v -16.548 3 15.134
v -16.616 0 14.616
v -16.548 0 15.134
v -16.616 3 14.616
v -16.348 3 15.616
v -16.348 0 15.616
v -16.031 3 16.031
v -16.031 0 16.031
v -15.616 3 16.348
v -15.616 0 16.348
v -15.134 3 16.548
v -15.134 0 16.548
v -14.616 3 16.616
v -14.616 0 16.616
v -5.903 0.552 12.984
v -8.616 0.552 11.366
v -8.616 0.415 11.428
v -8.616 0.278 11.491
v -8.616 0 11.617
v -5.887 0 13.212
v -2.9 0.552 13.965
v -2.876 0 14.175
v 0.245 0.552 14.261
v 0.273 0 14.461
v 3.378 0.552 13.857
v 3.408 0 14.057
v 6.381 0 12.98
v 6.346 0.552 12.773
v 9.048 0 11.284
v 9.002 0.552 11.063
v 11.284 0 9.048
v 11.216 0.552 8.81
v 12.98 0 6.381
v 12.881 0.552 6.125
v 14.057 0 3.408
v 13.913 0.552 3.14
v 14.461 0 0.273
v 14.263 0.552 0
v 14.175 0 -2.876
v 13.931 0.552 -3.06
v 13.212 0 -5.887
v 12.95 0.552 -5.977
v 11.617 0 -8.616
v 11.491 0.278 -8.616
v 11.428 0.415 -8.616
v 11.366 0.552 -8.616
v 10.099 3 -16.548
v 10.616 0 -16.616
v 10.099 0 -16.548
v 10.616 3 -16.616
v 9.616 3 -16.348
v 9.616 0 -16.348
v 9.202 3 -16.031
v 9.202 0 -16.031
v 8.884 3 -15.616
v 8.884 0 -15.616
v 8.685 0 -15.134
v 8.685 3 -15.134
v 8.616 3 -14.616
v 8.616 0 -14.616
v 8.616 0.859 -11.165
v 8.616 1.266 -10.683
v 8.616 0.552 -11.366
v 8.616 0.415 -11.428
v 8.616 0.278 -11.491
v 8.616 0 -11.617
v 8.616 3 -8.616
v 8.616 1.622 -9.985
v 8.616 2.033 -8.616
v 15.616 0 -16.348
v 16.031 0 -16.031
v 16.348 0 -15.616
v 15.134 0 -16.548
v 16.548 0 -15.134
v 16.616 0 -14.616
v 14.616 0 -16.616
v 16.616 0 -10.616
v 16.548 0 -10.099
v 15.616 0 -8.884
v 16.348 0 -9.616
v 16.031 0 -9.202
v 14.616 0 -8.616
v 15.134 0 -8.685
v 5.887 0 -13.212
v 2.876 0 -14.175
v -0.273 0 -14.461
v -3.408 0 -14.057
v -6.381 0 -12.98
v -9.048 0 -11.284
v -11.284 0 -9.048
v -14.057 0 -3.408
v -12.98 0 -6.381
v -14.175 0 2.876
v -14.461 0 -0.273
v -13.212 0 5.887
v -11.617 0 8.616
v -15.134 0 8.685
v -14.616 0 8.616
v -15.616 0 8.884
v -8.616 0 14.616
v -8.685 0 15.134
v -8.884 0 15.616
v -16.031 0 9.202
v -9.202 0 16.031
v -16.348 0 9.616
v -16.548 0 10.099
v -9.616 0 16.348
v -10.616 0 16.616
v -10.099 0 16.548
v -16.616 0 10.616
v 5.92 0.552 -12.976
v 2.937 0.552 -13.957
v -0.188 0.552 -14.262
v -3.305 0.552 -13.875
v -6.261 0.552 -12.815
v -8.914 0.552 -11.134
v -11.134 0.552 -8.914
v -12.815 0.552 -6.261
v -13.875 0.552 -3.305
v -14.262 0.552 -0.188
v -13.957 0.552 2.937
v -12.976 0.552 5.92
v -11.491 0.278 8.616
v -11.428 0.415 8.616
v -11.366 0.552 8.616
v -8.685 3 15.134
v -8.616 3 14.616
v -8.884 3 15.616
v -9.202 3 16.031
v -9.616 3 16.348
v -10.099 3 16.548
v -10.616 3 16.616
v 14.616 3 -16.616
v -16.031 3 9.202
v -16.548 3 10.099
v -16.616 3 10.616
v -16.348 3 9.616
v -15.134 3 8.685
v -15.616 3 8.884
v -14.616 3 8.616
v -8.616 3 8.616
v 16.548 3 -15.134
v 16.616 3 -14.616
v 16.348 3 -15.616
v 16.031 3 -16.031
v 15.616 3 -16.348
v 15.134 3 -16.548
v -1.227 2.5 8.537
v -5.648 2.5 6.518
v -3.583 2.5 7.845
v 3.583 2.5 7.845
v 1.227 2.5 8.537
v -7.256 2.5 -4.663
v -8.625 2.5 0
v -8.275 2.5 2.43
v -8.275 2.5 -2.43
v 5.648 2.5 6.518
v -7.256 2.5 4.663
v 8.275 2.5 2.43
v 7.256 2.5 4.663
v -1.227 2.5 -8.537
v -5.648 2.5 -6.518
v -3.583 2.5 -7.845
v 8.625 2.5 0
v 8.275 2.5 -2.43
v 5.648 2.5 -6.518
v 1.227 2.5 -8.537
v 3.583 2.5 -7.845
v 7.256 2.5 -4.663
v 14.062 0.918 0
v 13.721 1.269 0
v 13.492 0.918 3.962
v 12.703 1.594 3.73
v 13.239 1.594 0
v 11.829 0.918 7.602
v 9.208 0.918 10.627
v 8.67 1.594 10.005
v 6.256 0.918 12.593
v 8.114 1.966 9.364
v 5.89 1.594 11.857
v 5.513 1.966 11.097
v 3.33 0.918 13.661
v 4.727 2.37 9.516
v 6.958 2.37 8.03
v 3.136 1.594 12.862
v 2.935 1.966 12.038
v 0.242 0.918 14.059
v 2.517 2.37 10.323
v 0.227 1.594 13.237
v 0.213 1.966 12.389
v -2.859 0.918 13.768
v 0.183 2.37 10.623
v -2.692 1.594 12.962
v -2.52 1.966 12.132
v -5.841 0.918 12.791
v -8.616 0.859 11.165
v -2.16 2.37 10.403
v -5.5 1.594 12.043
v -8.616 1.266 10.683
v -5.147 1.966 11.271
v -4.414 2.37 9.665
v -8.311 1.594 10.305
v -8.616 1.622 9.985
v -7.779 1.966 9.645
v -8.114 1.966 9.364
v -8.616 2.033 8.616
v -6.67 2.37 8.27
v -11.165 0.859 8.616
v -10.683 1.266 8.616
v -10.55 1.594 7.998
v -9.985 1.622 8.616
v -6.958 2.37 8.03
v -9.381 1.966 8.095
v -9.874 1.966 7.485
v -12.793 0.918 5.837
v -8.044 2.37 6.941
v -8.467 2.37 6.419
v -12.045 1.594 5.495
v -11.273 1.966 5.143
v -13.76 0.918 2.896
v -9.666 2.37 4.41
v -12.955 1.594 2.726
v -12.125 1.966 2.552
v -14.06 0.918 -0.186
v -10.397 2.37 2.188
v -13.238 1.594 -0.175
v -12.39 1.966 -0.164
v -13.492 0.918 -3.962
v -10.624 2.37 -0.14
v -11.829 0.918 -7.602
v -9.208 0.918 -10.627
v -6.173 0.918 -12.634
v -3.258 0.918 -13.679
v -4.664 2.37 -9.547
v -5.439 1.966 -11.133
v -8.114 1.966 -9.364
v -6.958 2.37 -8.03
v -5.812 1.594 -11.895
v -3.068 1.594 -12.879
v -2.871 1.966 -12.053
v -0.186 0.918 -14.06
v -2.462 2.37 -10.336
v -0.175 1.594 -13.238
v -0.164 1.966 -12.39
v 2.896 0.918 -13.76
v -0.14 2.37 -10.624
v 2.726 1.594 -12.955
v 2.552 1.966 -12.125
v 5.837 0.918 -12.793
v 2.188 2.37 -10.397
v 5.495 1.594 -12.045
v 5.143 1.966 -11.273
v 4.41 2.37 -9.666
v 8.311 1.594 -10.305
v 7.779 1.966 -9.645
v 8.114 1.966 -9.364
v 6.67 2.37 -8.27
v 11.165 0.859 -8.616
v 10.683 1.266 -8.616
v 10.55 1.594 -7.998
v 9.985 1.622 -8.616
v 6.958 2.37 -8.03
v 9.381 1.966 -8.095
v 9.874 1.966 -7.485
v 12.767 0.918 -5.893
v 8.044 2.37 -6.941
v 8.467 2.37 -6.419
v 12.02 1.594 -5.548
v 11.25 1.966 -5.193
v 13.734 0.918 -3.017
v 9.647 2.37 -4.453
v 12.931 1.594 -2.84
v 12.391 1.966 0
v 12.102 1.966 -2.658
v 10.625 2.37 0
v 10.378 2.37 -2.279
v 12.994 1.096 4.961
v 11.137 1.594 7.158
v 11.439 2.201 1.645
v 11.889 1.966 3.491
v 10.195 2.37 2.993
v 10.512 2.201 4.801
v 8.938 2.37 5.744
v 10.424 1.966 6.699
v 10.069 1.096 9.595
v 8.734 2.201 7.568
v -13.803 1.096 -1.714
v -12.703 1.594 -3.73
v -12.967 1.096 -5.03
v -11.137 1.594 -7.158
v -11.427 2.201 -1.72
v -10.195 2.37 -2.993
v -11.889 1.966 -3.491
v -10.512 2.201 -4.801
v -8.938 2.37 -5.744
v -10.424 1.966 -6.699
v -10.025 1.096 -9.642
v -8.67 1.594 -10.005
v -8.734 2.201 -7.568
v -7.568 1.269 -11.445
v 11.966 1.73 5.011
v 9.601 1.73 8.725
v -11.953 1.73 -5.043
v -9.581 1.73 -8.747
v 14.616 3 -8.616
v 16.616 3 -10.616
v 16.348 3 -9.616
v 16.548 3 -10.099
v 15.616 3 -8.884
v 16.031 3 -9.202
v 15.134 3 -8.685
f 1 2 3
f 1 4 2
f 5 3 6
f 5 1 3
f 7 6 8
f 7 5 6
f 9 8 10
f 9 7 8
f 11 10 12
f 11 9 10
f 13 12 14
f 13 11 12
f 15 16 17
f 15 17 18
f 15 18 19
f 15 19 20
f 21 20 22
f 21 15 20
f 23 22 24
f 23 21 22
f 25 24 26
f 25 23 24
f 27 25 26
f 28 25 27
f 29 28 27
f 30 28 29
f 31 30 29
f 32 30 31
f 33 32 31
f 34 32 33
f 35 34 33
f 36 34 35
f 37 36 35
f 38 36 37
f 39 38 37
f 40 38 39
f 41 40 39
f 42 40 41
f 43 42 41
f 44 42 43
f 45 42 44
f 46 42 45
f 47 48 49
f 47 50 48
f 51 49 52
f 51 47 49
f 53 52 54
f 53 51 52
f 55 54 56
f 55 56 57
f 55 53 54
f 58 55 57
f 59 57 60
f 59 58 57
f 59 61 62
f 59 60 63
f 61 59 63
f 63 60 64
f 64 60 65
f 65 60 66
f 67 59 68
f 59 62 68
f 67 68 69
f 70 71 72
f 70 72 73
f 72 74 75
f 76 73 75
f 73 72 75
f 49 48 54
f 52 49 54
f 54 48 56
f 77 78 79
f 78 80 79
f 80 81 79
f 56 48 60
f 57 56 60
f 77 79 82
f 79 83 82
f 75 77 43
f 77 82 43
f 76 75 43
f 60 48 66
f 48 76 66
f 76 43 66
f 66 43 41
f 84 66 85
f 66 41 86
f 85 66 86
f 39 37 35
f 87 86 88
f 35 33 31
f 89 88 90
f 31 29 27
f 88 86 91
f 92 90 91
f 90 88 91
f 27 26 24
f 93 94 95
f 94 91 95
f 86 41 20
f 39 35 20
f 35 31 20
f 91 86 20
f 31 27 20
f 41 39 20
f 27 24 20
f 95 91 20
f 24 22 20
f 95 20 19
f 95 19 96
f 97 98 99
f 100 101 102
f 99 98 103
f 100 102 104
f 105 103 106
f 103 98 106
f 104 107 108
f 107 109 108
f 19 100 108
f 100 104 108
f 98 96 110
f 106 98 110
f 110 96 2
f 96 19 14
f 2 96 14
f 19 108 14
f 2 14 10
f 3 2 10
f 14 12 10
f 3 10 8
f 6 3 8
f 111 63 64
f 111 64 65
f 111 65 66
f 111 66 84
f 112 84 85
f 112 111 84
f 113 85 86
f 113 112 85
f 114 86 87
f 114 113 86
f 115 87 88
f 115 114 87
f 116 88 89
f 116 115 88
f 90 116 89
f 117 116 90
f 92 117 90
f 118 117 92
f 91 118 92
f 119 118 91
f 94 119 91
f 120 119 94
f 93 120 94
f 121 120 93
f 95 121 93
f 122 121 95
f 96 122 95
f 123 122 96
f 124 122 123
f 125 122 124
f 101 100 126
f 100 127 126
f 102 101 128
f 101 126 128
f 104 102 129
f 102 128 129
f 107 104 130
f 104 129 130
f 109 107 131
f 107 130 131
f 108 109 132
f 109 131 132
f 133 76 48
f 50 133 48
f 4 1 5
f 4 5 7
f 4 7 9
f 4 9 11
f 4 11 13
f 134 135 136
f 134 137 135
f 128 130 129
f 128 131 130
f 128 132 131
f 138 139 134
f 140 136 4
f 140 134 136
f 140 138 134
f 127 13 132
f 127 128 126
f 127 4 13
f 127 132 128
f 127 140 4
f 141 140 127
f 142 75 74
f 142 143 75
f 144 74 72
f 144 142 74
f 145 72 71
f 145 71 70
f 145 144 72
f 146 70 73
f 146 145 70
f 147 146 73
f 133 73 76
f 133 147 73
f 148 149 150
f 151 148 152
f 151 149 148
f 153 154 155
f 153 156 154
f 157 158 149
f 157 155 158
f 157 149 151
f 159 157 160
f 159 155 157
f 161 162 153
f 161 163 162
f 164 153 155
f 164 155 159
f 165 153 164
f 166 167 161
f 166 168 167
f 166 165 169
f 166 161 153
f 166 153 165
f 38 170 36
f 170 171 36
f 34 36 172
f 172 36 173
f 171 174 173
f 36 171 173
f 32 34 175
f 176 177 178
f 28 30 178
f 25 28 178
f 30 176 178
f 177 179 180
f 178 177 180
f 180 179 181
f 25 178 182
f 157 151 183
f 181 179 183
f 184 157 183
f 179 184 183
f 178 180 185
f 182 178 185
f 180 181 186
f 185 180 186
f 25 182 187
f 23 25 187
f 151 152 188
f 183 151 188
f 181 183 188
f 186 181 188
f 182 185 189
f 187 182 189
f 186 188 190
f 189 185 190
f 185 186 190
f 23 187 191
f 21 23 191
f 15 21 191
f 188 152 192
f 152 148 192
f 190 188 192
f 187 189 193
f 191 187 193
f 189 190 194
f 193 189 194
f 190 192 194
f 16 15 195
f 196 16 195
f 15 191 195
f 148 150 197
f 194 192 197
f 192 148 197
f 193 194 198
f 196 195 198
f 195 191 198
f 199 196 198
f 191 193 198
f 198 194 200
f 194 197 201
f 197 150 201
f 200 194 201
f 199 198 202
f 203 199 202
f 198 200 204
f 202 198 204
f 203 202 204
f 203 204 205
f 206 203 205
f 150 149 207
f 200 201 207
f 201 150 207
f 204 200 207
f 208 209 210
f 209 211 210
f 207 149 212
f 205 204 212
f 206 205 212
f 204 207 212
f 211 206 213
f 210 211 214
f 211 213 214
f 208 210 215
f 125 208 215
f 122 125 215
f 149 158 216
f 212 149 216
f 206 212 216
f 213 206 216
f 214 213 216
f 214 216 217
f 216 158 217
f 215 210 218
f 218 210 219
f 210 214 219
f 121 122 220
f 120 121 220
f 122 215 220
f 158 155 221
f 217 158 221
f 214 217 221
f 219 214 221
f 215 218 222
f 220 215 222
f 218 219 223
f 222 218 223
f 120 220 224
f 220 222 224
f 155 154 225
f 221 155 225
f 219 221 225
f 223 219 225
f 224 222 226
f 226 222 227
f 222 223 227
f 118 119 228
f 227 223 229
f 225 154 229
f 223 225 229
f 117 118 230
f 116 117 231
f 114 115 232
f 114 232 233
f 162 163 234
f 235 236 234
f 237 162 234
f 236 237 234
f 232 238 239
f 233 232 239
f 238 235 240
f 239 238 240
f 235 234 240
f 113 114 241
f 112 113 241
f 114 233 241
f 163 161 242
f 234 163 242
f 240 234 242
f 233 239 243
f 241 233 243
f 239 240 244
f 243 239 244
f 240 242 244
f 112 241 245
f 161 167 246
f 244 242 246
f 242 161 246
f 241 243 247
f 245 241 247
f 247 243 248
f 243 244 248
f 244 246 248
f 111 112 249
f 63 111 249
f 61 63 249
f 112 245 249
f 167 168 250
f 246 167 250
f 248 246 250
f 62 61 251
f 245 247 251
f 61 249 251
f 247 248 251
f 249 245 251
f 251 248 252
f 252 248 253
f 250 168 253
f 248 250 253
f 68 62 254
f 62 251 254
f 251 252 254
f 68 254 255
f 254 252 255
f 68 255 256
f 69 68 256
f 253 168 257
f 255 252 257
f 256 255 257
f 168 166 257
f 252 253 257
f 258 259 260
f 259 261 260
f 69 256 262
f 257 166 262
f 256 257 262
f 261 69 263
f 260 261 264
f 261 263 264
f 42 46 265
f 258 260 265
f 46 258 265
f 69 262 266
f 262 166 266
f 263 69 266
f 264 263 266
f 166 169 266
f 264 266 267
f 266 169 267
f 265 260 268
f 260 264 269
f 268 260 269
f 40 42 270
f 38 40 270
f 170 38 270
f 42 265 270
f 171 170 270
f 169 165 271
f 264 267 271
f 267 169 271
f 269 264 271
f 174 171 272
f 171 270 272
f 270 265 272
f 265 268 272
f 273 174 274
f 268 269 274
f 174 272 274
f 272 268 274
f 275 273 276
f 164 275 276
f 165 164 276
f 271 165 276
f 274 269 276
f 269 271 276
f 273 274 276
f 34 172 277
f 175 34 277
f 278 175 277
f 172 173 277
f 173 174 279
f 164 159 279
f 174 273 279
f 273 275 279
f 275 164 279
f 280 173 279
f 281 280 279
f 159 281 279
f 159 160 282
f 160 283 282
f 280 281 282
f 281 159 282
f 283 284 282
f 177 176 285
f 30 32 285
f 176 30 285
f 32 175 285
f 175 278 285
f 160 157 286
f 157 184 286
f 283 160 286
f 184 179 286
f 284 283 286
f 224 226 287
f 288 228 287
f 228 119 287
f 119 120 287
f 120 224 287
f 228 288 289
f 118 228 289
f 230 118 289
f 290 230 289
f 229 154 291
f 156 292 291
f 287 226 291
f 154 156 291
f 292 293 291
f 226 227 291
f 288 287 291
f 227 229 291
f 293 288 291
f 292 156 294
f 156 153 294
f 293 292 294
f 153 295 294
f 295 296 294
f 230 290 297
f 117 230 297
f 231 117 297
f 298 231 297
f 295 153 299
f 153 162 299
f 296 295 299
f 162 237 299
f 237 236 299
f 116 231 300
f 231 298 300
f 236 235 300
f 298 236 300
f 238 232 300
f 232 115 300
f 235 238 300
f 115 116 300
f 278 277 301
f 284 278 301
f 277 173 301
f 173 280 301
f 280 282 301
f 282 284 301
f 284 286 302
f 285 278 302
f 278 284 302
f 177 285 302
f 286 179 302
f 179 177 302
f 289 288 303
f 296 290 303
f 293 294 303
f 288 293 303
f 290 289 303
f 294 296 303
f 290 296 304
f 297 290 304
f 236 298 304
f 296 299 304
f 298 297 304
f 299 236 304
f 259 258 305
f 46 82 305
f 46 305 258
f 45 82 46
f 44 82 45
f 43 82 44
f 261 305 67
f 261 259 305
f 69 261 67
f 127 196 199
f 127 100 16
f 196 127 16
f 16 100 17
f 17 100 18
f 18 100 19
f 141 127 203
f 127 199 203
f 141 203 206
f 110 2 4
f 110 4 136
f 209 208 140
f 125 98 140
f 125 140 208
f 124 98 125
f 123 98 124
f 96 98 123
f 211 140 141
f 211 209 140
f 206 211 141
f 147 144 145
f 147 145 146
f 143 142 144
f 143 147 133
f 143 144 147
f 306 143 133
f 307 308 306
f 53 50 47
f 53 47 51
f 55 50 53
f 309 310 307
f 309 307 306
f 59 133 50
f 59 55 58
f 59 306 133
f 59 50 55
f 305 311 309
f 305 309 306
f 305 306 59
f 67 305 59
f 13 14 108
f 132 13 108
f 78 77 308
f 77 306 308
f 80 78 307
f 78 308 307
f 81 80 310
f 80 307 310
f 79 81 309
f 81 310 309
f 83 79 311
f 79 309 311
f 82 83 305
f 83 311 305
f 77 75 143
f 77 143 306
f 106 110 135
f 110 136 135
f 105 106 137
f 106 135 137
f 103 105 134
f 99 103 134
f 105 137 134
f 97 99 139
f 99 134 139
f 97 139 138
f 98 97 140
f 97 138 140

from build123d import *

# Parameters (mm, degrees)
SKETCH2_R                = 14.463803576
BOSS_EXTRUDE1_DEPTH      = 2.5
BOSS_EXTRUDE1_TAPER      = 20
SKETCH4_W                = 8
SKETCH4_H                = 8
BOSS_EXTRUDE2_DEPTH      = 3
FILLET2_R                = 2
CIRPATTERN1_COUNT        = 4
FILLET2_OF_CIRPATTERN1_R = 2


with BuildPart() as part:
    # Sketch2 → Boss-Extrude1 (new body)
    with BuildSketch(Plane(origin=(0, 0, 0), x_dir=(1, 0, 0), z_dir=(0, 1, 0))):
        Circle(SKETCH2_R)
    extrude(amount=BOSS_EXTRUDE1_DEPTH, taper=BOSS_EXTRUDE1_TAPER)

    # Fillet1
    # an asymmetric fillet: 6, 4 mm, written as the material it takes off along each edge
    with BuildSketch(Plane(origin=(0, 2.5, 0), x_dir=(1, 0, 0), z_dir=(0, 0, -1))) as fillet1_piece_1:
        with BuildLine():
            Bezier((14.262848017, 1.94787914), (13.55387799, 0), (8.624692292, 0), weights=[1, 0.819152044, 1])
            Line((8.624692292, 0), (13.55387799, 0))
            Line((13.55387799, 0), (14.262848017, 1.94787914))
        make_face()
    revolve(axis=Axis((0, 2.5, 0), (0, -1, 0)), mode=Mode.SUBTRACT)

    # Sketch4 → Boss-Extrude2 (add)
    with BuildSketch(Plane(origin=(0, 0, 0), x_dir=(1, 0, 0), z_dir=(0, 1, 0))):
        with Locations((-12.616427752, -12.616427752)):
            Rectangle(SKETCH4_W, SKETCH4_H)
    boss_extrude2 = extrude(amount=BOSS_EXTRUDE2_DEPTH)

    # Fillet2
    fillet2_edges = [part.edges().sort_by_distance(p)[0] for p in [
        (-8.616427752, 1.5, 16.616427752),
        (-16.616427752, 1.5, 8.616427752),
        (-16.616427752, 1.5, 16.616427752),
    ]]
    fillet(fillet2_edges, radius=FILLET2_R)

    # CirPattern1: Boss-Extrude2 ×4 about axis, 2 skipped
    cirpattern1_axis = Axis((0, 0, 0), (0, 1, 0))
    add([boss_extrude2.rotate(cirpattern1_axis, i * 360 / CIRPATTERN1_COUNT) for i in range(1, CIRPATTERN1_COUNT) if i not in (1, 3)])

    # Fillet2 of CirPattern1
    fillet2_of_cirpattern1_edges = [part.edges().sort_by_distance(p)[0] for p in [
        (8.616427752, 1.5, -16.616427752),
        (16.616427752, 1.5, -8.616427752),
        (16.616427752, 1.5, -16.616427752),
    ]]
    fillet(fillet2_of_cirpattern1_edges, radius=FILLET2_OF_CIRPATTERN1_R)


solid = part.part
